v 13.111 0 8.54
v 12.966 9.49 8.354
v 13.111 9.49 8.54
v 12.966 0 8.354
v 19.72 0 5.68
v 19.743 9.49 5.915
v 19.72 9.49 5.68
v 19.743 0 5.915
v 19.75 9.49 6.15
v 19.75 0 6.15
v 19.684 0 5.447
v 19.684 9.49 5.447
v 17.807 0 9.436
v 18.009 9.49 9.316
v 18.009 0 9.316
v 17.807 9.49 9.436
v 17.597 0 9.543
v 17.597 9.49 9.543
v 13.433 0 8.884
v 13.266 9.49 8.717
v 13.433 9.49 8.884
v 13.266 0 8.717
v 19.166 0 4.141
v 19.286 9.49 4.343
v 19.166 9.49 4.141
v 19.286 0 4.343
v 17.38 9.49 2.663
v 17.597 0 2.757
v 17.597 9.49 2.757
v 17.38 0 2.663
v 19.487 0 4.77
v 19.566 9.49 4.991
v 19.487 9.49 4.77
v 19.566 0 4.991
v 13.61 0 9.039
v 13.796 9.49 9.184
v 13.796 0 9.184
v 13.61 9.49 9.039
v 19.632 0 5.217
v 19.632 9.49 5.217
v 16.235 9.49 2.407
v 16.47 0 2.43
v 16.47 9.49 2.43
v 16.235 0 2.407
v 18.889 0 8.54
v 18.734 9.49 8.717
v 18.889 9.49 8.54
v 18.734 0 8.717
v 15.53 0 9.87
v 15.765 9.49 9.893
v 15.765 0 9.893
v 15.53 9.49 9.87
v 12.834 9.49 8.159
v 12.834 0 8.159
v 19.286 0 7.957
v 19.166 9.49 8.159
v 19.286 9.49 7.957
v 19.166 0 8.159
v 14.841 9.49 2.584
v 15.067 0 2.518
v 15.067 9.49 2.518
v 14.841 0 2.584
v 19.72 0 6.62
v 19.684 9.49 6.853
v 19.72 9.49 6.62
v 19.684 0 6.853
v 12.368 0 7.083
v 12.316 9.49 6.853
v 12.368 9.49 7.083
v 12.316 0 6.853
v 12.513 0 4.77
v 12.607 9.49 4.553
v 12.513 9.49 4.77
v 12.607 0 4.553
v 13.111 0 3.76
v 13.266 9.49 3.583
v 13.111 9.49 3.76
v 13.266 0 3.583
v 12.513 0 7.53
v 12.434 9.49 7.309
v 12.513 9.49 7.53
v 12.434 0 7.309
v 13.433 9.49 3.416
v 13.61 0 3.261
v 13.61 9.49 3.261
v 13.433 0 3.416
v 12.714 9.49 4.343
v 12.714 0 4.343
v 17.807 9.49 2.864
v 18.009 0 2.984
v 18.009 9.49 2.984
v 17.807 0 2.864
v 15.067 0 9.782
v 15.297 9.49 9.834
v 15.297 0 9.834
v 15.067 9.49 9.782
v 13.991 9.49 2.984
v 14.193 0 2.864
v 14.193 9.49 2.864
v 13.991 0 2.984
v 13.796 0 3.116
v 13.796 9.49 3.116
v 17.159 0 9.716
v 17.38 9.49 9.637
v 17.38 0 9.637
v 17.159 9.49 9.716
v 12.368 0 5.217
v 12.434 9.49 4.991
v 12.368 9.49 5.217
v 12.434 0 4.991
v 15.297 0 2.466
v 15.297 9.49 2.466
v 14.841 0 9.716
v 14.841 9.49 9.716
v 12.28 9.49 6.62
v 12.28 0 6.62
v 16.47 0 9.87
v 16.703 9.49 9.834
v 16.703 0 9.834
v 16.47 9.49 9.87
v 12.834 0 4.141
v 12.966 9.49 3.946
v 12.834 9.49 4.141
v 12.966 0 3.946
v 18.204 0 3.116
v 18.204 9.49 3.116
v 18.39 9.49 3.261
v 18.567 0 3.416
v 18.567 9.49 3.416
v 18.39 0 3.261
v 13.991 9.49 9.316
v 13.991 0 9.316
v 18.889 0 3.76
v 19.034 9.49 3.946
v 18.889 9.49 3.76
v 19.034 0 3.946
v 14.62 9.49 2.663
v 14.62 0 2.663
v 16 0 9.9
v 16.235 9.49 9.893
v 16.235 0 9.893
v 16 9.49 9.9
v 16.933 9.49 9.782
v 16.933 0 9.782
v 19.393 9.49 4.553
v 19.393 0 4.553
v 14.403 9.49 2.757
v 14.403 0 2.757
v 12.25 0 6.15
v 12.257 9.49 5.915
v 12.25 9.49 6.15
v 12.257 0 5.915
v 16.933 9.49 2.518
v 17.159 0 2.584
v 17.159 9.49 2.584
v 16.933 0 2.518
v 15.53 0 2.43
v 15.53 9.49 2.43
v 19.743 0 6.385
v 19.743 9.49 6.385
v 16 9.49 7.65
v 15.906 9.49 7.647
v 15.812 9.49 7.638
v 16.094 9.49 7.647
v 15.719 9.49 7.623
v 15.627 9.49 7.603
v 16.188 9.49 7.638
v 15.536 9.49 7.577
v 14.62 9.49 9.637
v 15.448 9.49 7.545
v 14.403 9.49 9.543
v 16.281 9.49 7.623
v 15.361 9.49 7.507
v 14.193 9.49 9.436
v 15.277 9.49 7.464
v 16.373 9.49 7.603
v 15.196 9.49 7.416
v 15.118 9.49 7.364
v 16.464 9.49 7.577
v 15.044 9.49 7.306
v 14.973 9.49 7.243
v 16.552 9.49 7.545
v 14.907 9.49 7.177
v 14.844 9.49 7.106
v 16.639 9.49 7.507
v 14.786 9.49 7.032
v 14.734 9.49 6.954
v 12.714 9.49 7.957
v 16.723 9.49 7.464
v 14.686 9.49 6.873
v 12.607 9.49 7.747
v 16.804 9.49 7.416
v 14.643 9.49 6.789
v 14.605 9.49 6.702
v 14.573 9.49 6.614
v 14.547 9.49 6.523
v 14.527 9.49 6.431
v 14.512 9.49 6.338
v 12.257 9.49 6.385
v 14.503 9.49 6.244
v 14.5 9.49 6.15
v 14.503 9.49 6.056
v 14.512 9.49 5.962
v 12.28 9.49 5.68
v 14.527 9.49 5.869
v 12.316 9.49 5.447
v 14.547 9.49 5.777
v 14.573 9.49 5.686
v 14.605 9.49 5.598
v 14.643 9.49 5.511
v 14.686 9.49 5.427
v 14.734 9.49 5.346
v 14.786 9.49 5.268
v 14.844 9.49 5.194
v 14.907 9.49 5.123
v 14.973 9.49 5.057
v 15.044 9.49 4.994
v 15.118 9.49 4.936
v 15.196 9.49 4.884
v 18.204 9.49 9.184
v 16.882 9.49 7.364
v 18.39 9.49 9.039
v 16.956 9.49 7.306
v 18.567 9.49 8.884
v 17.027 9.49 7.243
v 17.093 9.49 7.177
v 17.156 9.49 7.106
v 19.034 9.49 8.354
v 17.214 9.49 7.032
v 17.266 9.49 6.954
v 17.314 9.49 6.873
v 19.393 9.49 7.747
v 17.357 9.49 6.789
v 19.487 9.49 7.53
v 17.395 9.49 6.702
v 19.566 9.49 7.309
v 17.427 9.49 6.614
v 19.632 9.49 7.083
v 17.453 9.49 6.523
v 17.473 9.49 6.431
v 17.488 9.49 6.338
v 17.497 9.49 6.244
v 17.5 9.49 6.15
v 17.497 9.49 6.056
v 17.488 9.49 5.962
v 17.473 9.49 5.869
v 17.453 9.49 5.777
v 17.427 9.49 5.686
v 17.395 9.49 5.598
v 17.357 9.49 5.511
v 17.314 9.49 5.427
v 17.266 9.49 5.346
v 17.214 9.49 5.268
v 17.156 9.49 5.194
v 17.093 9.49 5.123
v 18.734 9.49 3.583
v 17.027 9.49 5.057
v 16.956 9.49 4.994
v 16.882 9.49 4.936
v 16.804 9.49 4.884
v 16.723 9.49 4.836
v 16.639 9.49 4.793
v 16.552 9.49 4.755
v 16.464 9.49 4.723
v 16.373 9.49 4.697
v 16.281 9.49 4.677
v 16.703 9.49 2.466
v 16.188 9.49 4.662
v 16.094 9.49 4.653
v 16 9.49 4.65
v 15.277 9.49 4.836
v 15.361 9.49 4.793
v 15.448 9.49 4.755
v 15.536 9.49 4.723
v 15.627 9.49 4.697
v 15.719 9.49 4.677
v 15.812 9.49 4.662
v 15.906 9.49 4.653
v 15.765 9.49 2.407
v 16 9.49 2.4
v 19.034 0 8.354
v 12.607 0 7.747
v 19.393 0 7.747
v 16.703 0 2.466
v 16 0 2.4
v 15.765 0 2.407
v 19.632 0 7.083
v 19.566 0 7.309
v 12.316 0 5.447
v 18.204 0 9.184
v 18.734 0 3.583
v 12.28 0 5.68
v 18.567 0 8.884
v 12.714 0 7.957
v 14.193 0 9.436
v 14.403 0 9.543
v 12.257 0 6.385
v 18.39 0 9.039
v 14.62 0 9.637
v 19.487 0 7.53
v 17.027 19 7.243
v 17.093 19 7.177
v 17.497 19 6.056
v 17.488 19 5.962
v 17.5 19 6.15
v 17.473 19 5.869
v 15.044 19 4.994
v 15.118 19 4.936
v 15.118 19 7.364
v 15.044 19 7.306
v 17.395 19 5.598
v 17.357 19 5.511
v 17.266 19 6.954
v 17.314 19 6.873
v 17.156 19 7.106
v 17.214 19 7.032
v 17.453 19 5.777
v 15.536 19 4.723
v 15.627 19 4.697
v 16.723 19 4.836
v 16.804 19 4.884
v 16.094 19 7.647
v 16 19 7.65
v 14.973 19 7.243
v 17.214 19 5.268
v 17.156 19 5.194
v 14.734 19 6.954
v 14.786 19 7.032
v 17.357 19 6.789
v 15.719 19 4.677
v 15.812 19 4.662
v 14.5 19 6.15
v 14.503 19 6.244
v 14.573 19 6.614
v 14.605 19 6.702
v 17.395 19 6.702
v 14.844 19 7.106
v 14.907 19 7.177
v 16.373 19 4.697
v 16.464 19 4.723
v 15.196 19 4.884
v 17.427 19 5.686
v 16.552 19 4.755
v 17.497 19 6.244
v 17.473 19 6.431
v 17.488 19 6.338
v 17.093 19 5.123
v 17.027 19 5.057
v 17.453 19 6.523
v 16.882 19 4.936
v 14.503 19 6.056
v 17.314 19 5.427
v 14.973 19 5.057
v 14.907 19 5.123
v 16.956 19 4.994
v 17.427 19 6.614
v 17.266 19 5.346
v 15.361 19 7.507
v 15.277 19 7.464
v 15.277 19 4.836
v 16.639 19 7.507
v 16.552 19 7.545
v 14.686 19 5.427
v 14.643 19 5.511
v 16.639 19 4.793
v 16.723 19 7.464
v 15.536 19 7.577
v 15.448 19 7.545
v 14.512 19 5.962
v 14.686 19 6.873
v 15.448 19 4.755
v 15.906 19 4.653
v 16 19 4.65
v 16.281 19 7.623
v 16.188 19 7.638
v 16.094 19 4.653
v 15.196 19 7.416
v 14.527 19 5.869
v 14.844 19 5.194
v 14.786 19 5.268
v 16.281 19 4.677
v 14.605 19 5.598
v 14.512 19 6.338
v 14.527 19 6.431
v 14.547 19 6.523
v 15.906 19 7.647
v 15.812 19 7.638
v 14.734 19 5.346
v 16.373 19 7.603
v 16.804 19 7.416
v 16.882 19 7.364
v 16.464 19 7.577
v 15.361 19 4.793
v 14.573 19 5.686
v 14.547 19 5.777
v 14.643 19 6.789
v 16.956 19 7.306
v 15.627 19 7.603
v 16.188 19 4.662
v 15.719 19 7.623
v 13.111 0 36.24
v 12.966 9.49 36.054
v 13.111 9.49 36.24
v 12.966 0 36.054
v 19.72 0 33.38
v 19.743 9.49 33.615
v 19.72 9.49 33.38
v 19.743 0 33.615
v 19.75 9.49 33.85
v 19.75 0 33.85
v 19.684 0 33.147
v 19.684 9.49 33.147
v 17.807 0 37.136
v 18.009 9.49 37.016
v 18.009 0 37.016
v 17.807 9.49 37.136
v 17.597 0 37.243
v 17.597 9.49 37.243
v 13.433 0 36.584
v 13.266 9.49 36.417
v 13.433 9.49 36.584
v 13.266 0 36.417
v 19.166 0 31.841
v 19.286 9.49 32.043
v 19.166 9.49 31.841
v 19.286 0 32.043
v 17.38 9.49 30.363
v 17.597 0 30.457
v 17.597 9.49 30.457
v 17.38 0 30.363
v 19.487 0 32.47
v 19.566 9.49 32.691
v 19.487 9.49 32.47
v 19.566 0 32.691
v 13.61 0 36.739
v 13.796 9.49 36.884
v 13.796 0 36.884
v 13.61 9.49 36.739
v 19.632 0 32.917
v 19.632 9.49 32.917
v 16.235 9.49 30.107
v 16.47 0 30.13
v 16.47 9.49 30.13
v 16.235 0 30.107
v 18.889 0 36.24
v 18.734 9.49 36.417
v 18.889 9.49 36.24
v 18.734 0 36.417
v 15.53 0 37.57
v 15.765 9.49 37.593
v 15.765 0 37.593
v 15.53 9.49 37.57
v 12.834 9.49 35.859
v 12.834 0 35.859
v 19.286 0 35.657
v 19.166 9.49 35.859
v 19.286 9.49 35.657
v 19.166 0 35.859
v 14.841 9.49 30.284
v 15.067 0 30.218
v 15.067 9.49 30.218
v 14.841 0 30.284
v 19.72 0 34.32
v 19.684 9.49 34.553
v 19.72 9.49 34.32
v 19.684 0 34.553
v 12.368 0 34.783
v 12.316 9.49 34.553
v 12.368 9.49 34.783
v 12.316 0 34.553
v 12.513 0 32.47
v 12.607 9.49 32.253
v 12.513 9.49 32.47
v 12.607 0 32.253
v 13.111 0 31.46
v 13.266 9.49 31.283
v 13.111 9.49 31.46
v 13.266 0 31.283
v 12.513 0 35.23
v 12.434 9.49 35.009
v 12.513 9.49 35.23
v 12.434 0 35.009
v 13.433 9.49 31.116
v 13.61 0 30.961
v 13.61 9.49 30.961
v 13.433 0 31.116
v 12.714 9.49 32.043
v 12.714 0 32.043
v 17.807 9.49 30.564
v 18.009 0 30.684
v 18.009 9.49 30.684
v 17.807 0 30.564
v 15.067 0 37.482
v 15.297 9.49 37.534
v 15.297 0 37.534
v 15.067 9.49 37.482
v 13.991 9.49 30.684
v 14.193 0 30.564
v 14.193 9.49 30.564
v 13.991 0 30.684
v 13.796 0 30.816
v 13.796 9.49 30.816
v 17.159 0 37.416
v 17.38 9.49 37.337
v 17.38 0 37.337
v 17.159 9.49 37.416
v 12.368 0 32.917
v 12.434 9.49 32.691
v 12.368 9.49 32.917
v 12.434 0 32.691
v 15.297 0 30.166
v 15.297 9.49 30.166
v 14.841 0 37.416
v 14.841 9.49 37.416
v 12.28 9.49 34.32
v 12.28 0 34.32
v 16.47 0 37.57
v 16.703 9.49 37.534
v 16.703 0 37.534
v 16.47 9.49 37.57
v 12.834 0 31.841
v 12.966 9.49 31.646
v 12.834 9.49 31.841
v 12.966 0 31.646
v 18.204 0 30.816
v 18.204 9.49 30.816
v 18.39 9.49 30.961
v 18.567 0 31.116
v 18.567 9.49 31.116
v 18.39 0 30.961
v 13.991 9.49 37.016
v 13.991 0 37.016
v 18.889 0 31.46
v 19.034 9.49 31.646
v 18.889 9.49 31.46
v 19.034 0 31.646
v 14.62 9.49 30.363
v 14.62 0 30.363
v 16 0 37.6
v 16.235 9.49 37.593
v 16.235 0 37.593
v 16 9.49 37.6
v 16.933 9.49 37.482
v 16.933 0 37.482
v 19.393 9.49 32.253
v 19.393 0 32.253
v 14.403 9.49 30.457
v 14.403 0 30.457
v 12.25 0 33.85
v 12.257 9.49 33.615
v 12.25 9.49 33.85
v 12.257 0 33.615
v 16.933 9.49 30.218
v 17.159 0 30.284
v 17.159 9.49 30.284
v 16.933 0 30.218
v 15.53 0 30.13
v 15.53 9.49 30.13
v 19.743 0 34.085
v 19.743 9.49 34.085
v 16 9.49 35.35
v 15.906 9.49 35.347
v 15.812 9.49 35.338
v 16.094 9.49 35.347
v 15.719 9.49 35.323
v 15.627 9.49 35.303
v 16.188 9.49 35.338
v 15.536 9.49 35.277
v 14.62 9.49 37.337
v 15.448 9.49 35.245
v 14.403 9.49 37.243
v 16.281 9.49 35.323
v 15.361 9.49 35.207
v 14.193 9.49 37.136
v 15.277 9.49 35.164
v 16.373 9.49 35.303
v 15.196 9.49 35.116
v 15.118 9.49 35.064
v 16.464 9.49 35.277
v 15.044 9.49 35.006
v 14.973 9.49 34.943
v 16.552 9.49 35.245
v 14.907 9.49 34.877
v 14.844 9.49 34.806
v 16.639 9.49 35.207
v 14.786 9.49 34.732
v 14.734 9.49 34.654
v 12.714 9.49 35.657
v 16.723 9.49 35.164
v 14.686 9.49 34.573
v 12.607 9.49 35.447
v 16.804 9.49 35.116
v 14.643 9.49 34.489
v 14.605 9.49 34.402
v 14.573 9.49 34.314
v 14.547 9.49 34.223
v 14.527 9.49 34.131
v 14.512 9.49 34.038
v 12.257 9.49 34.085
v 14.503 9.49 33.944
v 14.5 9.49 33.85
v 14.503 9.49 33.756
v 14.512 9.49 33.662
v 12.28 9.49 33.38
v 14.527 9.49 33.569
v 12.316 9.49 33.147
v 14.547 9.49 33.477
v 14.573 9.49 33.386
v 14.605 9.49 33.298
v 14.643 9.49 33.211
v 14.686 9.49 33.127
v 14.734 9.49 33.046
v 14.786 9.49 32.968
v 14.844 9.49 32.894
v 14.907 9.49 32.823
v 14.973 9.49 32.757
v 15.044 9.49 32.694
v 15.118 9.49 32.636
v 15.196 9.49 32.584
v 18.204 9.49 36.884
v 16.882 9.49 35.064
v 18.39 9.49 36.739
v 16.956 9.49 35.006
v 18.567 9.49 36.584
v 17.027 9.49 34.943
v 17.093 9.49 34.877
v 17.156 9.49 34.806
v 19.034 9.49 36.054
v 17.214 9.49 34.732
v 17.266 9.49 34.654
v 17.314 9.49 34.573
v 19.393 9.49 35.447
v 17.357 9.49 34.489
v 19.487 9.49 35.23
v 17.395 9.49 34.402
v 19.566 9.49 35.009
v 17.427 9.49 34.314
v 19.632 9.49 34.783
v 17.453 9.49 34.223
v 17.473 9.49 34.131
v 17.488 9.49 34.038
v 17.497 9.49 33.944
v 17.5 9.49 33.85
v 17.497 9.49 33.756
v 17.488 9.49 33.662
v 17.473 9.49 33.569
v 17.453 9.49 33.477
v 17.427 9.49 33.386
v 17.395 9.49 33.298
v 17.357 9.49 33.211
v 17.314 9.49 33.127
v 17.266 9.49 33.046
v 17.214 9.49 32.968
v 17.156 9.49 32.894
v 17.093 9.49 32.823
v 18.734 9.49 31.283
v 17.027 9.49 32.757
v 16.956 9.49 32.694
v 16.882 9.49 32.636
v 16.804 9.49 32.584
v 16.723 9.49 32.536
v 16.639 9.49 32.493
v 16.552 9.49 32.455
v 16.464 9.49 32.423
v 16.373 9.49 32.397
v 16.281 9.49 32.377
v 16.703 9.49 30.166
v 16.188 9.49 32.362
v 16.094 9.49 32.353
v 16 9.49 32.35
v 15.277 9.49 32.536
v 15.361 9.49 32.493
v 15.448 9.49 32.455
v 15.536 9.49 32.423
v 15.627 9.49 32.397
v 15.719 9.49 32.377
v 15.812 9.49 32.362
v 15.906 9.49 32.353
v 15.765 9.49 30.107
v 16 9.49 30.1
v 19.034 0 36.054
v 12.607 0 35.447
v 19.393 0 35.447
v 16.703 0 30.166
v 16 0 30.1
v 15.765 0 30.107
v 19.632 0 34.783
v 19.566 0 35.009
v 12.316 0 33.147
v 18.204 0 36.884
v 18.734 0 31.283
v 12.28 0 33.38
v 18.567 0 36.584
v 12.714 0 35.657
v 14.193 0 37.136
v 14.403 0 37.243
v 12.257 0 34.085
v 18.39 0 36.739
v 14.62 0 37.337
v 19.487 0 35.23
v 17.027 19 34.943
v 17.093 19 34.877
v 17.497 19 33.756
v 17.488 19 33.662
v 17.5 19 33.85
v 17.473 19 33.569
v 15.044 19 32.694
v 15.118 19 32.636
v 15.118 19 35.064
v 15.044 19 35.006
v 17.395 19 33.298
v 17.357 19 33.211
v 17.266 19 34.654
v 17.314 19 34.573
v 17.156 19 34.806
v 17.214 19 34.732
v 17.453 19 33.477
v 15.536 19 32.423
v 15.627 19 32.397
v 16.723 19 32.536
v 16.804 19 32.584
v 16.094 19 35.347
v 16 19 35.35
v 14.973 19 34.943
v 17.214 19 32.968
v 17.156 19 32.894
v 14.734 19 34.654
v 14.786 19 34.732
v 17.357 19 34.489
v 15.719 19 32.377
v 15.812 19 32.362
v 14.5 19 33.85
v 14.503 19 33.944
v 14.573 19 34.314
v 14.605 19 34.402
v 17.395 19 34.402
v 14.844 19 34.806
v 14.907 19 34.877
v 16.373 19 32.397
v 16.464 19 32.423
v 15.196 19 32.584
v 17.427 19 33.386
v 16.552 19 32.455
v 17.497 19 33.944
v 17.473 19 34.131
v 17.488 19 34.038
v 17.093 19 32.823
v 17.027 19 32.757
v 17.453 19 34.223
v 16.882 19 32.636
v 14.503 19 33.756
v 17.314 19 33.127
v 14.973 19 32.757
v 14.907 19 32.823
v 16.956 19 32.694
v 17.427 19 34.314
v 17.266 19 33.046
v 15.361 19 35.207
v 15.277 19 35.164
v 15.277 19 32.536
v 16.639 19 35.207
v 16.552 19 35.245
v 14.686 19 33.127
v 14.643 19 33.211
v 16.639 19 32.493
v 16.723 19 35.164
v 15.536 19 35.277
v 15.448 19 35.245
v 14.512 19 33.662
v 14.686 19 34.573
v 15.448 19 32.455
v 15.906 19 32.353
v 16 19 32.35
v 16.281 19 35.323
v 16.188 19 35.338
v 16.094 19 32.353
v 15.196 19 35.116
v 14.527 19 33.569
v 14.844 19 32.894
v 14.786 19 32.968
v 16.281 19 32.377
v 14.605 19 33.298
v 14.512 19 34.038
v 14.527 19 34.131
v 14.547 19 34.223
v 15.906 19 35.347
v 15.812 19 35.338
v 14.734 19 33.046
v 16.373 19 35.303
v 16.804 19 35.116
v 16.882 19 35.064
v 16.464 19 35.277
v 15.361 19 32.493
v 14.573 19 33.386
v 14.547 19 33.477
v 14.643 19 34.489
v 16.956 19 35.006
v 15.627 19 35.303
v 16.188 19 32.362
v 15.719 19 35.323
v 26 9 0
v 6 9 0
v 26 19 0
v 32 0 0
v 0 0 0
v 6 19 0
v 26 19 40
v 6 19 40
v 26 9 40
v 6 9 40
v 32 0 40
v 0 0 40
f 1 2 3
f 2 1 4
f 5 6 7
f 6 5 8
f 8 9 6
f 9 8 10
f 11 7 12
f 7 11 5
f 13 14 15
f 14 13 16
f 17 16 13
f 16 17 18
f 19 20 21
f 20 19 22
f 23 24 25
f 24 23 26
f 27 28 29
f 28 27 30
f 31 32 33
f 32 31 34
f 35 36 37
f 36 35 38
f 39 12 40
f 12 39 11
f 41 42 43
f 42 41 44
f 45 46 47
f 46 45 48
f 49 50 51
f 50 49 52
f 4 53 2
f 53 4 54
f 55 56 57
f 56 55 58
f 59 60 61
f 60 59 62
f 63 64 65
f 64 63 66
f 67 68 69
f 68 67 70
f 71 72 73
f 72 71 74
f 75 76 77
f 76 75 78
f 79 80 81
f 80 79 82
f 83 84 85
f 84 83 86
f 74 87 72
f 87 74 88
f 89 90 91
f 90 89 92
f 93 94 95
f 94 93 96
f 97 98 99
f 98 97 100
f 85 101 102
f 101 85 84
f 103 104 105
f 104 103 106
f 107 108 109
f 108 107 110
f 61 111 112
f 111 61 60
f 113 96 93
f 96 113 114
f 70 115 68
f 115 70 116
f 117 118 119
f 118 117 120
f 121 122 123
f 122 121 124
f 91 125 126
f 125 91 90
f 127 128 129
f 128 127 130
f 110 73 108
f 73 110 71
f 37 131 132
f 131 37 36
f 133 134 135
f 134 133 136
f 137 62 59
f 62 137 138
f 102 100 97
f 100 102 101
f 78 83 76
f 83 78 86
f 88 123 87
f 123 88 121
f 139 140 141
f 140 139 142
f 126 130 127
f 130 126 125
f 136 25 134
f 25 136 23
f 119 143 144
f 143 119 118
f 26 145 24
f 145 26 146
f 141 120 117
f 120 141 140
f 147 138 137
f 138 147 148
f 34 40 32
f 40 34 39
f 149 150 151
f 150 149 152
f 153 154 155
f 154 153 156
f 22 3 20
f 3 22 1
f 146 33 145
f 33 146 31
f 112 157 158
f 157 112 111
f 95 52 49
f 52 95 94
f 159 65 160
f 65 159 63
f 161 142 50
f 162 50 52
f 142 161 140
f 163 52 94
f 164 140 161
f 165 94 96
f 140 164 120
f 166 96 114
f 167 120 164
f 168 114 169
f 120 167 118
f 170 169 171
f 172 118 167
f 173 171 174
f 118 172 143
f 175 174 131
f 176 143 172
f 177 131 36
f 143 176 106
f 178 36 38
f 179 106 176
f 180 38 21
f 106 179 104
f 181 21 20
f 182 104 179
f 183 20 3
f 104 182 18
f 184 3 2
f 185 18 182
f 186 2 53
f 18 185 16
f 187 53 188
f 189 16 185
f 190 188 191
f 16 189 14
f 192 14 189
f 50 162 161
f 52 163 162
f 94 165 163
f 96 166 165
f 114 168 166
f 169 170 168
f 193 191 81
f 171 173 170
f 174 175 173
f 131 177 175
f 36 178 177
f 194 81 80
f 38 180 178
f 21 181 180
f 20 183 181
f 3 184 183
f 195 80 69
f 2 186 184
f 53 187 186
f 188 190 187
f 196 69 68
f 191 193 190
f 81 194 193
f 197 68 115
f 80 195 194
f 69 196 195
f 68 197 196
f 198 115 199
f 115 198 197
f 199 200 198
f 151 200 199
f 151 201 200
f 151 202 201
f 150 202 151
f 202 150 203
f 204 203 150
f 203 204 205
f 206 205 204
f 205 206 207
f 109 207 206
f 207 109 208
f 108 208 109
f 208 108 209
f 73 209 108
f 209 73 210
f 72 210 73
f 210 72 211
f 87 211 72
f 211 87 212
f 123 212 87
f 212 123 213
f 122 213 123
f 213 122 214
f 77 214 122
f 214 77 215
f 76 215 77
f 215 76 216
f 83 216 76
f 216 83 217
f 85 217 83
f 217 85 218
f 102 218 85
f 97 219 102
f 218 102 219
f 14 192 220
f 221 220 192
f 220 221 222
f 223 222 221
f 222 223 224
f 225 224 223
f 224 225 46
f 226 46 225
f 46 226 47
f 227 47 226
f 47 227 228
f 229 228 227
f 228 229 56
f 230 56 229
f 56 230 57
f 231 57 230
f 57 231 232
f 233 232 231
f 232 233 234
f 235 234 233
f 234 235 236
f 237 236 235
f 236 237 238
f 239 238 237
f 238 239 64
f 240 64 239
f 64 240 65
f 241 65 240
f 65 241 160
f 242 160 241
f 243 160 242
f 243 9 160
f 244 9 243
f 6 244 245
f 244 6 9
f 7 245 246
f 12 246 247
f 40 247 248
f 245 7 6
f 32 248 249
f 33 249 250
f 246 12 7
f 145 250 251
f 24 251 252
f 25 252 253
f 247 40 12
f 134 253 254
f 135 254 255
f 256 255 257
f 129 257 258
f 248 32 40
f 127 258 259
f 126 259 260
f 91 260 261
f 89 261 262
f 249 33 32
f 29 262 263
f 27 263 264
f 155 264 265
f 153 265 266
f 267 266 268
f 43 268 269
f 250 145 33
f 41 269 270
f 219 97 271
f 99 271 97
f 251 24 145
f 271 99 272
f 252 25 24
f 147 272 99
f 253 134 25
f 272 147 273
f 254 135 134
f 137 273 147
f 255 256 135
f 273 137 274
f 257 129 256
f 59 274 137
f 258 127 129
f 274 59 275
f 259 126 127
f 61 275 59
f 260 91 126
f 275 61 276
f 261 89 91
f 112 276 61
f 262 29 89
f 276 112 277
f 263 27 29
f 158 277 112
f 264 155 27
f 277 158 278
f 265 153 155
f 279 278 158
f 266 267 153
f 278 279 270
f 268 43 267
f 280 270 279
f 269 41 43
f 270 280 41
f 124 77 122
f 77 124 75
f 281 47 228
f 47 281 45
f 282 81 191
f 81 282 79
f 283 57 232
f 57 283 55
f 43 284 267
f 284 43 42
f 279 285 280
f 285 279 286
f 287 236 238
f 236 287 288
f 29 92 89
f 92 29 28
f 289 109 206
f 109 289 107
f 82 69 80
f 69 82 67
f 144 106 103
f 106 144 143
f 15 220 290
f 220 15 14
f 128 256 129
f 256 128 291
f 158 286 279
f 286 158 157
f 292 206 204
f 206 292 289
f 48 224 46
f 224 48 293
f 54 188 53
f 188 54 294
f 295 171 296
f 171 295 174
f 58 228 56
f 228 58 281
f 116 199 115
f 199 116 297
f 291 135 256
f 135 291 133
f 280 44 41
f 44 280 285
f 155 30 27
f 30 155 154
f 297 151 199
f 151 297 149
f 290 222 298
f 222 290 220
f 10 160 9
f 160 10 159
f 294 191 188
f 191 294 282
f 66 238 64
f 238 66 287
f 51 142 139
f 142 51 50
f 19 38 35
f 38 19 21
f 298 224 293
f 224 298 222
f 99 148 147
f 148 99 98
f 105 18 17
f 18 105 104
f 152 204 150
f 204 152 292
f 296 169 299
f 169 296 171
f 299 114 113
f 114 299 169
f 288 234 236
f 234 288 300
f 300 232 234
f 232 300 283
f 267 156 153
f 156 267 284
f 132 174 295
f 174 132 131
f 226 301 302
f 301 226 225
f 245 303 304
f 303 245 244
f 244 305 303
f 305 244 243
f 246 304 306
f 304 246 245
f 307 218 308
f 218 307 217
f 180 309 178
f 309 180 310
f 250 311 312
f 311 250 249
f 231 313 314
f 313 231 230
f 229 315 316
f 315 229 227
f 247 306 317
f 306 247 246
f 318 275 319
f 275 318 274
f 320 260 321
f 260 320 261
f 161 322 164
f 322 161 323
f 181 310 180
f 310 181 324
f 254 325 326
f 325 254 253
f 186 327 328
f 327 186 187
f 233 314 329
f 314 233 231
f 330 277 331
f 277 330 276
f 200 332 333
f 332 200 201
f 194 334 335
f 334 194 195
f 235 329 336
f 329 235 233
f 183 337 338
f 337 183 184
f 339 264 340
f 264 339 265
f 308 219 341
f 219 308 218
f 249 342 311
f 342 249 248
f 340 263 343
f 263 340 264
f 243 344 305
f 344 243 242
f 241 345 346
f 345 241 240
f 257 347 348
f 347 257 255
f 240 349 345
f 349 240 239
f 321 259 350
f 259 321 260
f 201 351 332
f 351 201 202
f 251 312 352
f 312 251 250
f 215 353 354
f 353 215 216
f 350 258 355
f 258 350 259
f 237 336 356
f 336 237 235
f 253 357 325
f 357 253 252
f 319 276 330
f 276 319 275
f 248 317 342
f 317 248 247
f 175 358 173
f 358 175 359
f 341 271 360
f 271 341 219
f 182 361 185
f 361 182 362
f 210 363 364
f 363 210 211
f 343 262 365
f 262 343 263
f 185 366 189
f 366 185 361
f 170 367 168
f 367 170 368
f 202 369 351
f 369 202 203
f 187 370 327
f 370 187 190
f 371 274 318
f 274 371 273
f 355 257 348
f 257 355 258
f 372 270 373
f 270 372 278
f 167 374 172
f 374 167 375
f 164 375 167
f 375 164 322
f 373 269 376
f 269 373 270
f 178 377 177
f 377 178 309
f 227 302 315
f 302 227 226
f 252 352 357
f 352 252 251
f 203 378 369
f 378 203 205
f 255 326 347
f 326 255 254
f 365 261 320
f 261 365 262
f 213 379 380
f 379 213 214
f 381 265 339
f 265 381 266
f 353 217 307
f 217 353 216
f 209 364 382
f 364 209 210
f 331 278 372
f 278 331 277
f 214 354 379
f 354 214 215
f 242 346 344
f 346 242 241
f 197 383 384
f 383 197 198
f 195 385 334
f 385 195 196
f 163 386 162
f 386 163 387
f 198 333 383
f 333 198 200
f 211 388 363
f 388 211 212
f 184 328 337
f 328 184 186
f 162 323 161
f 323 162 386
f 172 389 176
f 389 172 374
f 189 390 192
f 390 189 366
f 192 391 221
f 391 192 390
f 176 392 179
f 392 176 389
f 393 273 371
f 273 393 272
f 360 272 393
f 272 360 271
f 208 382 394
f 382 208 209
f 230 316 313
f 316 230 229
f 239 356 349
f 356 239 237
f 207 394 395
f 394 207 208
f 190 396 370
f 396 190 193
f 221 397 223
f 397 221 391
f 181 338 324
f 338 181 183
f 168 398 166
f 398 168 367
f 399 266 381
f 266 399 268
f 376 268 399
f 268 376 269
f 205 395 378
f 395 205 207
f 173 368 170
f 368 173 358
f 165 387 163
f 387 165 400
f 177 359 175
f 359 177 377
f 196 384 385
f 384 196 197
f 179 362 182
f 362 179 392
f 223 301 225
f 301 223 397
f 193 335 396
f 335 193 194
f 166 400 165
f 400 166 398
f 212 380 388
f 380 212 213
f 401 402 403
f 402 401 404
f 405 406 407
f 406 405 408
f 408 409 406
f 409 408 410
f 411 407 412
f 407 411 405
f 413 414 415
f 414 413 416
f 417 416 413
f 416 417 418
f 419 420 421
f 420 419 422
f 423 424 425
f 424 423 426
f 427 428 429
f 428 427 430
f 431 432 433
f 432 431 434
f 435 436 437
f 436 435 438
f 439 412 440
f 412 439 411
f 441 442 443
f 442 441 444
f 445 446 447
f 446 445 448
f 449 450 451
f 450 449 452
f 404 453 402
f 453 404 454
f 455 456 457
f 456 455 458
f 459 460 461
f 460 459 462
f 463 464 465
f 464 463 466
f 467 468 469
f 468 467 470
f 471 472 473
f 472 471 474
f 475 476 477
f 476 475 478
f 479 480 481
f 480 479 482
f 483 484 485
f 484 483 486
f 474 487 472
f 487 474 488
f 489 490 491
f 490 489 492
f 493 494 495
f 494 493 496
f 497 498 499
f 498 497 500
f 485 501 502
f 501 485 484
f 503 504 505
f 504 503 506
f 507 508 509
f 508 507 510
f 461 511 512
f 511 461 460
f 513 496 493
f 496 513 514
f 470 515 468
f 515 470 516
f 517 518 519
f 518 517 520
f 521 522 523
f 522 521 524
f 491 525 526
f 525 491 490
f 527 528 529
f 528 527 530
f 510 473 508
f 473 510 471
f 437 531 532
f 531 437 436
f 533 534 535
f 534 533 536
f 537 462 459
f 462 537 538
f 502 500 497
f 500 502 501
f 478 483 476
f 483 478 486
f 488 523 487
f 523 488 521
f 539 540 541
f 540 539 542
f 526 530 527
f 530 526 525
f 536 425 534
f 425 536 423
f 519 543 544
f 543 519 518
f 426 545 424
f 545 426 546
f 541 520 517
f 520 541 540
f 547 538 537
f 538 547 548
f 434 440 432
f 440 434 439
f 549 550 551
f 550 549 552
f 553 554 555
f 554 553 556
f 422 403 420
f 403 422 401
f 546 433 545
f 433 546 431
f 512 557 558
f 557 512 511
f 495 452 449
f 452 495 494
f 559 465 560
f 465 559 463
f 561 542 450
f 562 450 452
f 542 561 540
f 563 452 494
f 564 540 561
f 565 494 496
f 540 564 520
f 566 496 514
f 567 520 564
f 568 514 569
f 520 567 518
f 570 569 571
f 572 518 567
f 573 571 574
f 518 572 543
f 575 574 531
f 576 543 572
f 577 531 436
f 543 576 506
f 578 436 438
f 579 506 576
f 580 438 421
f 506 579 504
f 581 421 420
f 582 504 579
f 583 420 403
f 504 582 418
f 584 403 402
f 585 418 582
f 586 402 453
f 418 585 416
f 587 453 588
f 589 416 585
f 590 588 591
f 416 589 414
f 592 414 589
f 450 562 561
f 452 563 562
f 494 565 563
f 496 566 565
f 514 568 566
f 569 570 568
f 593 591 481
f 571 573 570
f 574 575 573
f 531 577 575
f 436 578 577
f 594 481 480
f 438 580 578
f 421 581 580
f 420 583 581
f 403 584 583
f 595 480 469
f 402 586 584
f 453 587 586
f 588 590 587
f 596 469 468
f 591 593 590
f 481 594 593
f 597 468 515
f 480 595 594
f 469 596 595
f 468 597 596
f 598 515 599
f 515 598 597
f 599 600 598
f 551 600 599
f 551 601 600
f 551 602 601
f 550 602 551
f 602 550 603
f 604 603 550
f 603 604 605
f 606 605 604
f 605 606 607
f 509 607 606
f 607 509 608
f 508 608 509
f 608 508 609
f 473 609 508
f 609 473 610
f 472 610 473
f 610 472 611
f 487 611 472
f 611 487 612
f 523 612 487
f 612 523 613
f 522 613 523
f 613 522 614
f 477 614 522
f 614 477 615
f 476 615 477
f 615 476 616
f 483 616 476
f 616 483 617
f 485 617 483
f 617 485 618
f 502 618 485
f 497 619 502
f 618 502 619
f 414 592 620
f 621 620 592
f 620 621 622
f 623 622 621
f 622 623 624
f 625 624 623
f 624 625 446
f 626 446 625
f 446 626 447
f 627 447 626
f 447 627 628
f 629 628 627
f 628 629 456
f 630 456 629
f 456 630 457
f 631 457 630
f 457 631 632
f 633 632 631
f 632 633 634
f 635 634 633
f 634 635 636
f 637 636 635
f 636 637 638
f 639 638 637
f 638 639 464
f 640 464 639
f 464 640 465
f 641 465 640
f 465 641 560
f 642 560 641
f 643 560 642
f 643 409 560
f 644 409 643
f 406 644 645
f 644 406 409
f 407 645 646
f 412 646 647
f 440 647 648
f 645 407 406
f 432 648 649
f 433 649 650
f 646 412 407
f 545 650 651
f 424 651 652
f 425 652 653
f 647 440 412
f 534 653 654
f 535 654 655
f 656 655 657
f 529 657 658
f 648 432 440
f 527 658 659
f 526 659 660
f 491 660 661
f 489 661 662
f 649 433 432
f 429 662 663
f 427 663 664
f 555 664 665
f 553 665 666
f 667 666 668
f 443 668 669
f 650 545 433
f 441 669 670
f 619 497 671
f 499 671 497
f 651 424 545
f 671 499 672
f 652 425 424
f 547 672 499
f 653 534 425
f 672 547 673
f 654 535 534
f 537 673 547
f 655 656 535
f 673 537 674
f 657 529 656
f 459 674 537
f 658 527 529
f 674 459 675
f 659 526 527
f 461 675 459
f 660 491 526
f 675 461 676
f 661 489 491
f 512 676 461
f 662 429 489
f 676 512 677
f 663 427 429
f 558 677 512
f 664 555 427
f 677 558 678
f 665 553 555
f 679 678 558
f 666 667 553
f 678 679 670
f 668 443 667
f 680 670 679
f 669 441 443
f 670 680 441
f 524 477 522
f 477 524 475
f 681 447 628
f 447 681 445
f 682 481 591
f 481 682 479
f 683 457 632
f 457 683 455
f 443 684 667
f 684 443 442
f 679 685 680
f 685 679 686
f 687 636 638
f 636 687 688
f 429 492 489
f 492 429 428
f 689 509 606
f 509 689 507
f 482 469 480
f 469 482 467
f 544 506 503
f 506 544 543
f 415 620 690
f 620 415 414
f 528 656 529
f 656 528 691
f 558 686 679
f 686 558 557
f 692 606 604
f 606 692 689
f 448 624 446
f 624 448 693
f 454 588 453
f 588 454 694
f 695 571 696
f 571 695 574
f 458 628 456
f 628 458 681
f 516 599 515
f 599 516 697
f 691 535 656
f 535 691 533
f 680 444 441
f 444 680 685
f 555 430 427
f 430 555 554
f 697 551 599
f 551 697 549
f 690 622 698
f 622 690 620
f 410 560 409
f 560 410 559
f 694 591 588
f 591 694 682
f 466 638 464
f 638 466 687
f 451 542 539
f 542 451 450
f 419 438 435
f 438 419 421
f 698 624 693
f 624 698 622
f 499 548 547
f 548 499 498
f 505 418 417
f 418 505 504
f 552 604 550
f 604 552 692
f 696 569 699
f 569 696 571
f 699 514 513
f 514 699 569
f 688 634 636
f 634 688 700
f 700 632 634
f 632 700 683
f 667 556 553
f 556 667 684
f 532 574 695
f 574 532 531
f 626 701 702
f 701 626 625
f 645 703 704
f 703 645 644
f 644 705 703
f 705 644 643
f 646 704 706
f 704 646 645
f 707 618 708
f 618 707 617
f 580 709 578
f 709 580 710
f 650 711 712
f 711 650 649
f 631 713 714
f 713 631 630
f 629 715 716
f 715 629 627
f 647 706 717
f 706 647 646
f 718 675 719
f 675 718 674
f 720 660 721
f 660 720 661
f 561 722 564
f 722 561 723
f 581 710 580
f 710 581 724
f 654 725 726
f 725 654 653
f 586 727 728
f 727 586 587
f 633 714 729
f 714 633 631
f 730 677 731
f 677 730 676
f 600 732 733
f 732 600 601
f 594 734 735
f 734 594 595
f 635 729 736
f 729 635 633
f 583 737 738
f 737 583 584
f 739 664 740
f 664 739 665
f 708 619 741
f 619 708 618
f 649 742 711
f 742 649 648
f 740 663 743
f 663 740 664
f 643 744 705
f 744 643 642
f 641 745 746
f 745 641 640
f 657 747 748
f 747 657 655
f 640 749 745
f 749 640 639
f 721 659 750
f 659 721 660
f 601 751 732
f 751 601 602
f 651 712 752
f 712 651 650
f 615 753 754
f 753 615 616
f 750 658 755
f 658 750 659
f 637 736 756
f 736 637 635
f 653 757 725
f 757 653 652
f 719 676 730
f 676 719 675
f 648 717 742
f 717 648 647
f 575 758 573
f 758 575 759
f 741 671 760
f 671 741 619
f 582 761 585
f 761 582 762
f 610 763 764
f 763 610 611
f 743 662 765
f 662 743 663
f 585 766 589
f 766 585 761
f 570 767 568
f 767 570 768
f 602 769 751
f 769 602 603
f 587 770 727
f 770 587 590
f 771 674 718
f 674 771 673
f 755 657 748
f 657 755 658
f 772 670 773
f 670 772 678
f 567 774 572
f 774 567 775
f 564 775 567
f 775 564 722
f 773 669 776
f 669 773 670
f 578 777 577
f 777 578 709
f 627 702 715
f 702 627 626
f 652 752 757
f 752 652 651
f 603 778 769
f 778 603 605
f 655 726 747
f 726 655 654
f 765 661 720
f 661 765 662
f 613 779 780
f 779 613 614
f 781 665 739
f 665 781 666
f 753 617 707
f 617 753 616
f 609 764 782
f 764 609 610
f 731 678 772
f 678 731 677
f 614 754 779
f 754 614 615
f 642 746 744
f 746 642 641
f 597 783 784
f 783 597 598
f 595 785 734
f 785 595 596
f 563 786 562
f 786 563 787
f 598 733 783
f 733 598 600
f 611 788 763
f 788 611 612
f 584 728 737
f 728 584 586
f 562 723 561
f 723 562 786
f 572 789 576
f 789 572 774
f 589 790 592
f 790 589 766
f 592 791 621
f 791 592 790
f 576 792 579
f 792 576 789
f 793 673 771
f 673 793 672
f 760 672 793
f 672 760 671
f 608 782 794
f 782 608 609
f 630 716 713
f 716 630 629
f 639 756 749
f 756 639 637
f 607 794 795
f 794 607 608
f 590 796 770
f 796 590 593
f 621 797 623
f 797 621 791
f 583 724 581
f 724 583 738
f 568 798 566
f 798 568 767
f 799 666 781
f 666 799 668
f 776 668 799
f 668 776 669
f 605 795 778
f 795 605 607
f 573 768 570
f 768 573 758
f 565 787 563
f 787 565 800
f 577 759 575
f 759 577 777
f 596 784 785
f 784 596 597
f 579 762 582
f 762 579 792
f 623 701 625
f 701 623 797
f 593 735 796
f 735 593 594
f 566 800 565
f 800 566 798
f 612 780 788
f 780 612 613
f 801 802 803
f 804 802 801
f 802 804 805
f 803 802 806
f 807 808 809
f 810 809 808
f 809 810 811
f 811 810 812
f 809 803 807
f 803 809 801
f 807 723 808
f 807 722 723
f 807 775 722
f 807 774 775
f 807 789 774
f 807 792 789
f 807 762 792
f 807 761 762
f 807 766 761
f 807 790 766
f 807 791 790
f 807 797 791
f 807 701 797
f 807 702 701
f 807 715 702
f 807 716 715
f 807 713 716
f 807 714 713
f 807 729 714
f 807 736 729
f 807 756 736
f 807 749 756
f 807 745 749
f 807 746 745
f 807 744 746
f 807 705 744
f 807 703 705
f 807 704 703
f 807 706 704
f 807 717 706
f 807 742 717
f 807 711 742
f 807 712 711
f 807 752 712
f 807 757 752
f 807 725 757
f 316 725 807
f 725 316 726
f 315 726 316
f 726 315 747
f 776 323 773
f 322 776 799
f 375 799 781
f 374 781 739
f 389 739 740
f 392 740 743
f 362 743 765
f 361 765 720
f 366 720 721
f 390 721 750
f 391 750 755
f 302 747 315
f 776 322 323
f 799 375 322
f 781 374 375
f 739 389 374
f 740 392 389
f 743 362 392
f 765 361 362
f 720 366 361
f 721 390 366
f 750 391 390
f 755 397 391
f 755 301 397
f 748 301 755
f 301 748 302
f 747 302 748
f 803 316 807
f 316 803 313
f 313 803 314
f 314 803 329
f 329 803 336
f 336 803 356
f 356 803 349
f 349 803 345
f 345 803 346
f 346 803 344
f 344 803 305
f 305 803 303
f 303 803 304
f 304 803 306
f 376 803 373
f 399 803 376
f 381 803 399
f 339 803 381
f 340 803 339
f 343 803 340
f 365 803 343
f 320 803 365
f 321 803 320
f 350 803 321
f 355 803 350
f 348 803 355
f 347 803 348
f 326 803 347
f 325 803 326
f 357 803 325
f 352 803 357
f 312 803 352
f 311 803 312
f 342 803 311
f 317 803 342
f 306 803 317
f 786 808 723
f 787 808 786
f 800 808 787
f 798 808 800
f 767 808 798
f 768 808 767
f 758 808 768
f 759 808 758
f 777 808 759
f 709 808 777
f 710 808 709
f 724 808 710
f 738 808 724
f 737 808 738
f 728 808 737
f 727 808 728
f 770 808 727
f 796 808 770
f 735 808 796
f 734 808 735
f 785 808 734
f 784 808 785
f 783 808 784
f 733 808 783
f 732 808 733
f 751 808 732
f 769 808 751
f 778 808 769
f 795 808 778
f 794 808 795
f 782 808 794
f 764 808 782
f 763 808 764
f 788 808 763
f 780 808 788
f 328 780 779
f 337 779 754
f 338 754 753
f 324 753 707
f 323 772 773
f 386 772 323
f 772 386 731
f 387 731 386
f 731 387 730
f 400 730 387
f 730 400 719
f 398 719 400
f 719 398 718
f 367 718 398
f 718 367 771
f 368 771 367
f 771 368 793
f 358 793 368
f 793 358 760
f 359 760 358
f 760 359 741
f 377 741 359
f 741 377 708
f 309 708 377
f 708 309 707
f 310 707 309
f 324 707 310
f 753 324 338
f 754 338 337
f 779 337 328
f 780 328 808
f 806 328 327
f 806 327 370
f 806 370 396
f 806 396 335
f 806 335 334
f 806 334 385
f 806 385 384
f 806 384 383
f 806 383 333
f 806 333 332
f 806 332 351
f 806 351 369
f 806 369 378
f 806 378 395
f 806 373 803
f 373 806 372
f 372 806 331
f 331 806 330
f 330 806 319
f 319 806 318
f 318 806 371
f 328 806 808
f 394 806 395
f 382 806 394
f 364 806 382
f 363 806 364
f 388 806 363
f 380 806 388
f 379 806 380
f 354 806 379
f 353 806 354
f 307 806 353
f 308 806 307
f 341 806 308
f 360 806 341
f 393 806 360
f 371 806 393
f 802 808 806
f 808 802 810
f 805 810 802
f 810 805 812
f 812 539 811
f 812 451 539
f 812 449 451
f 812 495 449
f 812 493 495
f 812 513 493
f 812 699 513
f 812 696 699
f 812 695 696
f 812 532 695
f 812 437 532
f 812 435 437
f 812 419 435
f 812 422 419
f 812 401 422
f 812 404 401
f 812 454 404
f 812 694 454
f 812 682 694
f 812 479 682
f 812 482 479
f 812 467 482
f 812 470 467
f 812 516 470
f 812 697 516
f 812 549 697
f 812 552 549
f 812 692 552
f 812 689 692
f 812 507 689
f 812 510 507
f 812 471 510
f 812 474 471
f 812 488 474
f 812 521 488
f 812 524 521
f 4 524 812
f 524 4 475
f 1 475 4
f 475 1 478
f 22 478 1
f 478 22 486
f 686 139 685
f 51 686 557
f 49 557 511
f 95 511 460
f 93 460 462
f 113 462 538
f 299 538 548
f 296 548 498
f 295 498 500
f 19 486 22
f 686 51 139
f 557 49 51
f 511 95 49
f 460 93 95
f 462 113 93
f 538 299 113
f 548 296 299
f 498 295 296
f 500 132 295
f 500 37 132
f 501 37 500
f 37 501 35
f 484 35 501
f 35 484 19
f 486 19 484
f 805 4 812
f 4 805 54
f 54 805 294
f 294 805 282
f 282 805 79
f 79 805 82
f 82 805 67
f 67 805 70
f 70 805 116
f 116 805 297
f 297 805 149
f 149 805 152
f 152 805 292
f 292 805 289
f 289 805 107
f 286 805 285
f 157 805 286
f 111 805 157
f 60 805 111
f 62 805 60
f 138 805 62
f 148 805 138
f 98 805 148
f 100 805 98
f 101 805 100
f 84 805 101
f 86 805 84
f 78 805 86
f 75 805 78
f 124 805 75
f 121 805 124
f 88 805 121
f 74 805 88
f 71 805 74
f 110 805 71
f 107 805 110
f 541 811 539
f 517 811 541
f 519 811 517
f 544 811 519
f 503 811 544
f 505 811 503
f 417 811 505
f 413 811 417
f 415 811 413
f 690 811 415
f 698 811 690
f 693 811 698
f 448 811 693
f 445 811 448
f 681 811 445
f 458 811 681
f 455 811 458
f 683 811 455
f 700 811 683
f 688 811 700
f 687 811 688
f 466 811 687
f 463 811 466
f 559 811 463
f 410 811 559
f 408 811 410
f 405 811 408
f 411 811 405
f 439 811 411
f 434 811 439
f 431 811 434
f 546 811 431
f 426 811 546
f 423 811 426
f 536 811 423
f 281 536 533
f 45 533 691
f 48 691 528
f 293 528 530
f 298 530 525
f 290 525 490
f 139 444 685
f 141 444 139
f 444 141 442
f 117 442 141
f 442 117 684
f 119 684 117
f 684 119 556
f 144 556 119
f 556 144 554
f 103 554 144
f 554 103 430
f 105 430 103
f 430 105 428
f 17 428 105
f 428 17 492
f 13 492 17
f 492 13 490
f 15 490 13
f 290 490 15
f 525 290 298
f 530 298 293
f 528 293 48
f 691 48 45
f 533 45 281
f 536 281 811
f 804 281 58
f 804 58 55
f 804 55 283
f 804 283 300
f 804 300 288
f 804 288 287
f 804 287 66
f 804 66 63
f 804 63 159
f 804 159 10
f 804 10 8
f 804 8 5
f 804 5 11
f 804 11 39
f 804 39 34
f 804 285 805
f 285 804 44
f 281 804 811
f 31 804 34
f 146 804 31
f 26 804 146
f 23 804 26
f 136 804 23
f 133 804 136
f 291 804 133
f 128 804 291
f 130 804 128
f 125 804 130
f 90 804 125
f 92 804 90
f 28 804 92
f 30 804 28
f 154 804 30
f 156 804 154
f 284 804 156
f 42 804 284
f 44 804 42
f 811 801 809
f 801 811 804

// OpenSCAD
$fn = 100;
EPS = 1e-2;
DOVETAIL_LENGTH = 40;
DOVETAIL_BOTTOM_WIDTH = 32;
DOVETAIL_TOP_WIDTH = 20;
DOVETAIL_HEIGHT = 9;
DOVETAIL_SCREW_DISTANCE = 27.7;
DOVETAIL_EXTRA_HEIGHT = 10;

module dovetail_mount_screw_hole() {
  total_height = DOVETAIL_HEIGHT + DOVETAIL_EXTRA_HEIGHT;
  rotate([-90, 0, 0])
    cylinder(h=total_height / 2, d=7.5);
  rotate([-90, 0, 0])
    cylinder(h=total_height * 2, d=3);
}

module dovetail_mount() {
  difference() {
    linear_extrude(DOVETAIL_LENGTH)
      polygon([
        [0, 0],
        [DOVETAIL_BOTTOM_WIDTH, 0],
        [DOVETAIL_BOTTOM_WIDTH / 2 + DOVETAIL_TOP_WIDTH / 2, DOVETAIL_HEIGHT],
        [DOVETAIL_BOTTOM_WIDTH / 2 + DOVETAIL_TOP_WIDTH / 2, DOVETAIL_HEIGHT + DOVETAIL_EXTRA_HEIGHT],
        [DOVETAIL_BOTTOM_WIDTH / 2 - DOVETAIL_TOP_WIDTH / 2, DOVETAIL_HEIGHT + DOVETAIL_EXTRA_HEIGHT],
        [DOVETAIL_BOTTOM_WIDTH / 2 - DOVETAIL_TOP_WIDTH / 2, DOVETAIL_HEIGHT],
      ]);
    translate([DOVETAIL_BOTTOM_WIDTH / 2, -EPS, DOVETAIL_LENGTH / 2 - DOVETAIL_SCREW_DISTANCE / 2])
      dovetail_mount_screw_hole();
    translate([DOVETAIL_BOTTOM_WIDTH / 2, -EPS, DOVETAIL_LENGTH / 2 + DOVETAIL_SCREW_DISTANCE / 2])
      dovetail_mount_screw_hole();
  }
}

dovetail_mount();
